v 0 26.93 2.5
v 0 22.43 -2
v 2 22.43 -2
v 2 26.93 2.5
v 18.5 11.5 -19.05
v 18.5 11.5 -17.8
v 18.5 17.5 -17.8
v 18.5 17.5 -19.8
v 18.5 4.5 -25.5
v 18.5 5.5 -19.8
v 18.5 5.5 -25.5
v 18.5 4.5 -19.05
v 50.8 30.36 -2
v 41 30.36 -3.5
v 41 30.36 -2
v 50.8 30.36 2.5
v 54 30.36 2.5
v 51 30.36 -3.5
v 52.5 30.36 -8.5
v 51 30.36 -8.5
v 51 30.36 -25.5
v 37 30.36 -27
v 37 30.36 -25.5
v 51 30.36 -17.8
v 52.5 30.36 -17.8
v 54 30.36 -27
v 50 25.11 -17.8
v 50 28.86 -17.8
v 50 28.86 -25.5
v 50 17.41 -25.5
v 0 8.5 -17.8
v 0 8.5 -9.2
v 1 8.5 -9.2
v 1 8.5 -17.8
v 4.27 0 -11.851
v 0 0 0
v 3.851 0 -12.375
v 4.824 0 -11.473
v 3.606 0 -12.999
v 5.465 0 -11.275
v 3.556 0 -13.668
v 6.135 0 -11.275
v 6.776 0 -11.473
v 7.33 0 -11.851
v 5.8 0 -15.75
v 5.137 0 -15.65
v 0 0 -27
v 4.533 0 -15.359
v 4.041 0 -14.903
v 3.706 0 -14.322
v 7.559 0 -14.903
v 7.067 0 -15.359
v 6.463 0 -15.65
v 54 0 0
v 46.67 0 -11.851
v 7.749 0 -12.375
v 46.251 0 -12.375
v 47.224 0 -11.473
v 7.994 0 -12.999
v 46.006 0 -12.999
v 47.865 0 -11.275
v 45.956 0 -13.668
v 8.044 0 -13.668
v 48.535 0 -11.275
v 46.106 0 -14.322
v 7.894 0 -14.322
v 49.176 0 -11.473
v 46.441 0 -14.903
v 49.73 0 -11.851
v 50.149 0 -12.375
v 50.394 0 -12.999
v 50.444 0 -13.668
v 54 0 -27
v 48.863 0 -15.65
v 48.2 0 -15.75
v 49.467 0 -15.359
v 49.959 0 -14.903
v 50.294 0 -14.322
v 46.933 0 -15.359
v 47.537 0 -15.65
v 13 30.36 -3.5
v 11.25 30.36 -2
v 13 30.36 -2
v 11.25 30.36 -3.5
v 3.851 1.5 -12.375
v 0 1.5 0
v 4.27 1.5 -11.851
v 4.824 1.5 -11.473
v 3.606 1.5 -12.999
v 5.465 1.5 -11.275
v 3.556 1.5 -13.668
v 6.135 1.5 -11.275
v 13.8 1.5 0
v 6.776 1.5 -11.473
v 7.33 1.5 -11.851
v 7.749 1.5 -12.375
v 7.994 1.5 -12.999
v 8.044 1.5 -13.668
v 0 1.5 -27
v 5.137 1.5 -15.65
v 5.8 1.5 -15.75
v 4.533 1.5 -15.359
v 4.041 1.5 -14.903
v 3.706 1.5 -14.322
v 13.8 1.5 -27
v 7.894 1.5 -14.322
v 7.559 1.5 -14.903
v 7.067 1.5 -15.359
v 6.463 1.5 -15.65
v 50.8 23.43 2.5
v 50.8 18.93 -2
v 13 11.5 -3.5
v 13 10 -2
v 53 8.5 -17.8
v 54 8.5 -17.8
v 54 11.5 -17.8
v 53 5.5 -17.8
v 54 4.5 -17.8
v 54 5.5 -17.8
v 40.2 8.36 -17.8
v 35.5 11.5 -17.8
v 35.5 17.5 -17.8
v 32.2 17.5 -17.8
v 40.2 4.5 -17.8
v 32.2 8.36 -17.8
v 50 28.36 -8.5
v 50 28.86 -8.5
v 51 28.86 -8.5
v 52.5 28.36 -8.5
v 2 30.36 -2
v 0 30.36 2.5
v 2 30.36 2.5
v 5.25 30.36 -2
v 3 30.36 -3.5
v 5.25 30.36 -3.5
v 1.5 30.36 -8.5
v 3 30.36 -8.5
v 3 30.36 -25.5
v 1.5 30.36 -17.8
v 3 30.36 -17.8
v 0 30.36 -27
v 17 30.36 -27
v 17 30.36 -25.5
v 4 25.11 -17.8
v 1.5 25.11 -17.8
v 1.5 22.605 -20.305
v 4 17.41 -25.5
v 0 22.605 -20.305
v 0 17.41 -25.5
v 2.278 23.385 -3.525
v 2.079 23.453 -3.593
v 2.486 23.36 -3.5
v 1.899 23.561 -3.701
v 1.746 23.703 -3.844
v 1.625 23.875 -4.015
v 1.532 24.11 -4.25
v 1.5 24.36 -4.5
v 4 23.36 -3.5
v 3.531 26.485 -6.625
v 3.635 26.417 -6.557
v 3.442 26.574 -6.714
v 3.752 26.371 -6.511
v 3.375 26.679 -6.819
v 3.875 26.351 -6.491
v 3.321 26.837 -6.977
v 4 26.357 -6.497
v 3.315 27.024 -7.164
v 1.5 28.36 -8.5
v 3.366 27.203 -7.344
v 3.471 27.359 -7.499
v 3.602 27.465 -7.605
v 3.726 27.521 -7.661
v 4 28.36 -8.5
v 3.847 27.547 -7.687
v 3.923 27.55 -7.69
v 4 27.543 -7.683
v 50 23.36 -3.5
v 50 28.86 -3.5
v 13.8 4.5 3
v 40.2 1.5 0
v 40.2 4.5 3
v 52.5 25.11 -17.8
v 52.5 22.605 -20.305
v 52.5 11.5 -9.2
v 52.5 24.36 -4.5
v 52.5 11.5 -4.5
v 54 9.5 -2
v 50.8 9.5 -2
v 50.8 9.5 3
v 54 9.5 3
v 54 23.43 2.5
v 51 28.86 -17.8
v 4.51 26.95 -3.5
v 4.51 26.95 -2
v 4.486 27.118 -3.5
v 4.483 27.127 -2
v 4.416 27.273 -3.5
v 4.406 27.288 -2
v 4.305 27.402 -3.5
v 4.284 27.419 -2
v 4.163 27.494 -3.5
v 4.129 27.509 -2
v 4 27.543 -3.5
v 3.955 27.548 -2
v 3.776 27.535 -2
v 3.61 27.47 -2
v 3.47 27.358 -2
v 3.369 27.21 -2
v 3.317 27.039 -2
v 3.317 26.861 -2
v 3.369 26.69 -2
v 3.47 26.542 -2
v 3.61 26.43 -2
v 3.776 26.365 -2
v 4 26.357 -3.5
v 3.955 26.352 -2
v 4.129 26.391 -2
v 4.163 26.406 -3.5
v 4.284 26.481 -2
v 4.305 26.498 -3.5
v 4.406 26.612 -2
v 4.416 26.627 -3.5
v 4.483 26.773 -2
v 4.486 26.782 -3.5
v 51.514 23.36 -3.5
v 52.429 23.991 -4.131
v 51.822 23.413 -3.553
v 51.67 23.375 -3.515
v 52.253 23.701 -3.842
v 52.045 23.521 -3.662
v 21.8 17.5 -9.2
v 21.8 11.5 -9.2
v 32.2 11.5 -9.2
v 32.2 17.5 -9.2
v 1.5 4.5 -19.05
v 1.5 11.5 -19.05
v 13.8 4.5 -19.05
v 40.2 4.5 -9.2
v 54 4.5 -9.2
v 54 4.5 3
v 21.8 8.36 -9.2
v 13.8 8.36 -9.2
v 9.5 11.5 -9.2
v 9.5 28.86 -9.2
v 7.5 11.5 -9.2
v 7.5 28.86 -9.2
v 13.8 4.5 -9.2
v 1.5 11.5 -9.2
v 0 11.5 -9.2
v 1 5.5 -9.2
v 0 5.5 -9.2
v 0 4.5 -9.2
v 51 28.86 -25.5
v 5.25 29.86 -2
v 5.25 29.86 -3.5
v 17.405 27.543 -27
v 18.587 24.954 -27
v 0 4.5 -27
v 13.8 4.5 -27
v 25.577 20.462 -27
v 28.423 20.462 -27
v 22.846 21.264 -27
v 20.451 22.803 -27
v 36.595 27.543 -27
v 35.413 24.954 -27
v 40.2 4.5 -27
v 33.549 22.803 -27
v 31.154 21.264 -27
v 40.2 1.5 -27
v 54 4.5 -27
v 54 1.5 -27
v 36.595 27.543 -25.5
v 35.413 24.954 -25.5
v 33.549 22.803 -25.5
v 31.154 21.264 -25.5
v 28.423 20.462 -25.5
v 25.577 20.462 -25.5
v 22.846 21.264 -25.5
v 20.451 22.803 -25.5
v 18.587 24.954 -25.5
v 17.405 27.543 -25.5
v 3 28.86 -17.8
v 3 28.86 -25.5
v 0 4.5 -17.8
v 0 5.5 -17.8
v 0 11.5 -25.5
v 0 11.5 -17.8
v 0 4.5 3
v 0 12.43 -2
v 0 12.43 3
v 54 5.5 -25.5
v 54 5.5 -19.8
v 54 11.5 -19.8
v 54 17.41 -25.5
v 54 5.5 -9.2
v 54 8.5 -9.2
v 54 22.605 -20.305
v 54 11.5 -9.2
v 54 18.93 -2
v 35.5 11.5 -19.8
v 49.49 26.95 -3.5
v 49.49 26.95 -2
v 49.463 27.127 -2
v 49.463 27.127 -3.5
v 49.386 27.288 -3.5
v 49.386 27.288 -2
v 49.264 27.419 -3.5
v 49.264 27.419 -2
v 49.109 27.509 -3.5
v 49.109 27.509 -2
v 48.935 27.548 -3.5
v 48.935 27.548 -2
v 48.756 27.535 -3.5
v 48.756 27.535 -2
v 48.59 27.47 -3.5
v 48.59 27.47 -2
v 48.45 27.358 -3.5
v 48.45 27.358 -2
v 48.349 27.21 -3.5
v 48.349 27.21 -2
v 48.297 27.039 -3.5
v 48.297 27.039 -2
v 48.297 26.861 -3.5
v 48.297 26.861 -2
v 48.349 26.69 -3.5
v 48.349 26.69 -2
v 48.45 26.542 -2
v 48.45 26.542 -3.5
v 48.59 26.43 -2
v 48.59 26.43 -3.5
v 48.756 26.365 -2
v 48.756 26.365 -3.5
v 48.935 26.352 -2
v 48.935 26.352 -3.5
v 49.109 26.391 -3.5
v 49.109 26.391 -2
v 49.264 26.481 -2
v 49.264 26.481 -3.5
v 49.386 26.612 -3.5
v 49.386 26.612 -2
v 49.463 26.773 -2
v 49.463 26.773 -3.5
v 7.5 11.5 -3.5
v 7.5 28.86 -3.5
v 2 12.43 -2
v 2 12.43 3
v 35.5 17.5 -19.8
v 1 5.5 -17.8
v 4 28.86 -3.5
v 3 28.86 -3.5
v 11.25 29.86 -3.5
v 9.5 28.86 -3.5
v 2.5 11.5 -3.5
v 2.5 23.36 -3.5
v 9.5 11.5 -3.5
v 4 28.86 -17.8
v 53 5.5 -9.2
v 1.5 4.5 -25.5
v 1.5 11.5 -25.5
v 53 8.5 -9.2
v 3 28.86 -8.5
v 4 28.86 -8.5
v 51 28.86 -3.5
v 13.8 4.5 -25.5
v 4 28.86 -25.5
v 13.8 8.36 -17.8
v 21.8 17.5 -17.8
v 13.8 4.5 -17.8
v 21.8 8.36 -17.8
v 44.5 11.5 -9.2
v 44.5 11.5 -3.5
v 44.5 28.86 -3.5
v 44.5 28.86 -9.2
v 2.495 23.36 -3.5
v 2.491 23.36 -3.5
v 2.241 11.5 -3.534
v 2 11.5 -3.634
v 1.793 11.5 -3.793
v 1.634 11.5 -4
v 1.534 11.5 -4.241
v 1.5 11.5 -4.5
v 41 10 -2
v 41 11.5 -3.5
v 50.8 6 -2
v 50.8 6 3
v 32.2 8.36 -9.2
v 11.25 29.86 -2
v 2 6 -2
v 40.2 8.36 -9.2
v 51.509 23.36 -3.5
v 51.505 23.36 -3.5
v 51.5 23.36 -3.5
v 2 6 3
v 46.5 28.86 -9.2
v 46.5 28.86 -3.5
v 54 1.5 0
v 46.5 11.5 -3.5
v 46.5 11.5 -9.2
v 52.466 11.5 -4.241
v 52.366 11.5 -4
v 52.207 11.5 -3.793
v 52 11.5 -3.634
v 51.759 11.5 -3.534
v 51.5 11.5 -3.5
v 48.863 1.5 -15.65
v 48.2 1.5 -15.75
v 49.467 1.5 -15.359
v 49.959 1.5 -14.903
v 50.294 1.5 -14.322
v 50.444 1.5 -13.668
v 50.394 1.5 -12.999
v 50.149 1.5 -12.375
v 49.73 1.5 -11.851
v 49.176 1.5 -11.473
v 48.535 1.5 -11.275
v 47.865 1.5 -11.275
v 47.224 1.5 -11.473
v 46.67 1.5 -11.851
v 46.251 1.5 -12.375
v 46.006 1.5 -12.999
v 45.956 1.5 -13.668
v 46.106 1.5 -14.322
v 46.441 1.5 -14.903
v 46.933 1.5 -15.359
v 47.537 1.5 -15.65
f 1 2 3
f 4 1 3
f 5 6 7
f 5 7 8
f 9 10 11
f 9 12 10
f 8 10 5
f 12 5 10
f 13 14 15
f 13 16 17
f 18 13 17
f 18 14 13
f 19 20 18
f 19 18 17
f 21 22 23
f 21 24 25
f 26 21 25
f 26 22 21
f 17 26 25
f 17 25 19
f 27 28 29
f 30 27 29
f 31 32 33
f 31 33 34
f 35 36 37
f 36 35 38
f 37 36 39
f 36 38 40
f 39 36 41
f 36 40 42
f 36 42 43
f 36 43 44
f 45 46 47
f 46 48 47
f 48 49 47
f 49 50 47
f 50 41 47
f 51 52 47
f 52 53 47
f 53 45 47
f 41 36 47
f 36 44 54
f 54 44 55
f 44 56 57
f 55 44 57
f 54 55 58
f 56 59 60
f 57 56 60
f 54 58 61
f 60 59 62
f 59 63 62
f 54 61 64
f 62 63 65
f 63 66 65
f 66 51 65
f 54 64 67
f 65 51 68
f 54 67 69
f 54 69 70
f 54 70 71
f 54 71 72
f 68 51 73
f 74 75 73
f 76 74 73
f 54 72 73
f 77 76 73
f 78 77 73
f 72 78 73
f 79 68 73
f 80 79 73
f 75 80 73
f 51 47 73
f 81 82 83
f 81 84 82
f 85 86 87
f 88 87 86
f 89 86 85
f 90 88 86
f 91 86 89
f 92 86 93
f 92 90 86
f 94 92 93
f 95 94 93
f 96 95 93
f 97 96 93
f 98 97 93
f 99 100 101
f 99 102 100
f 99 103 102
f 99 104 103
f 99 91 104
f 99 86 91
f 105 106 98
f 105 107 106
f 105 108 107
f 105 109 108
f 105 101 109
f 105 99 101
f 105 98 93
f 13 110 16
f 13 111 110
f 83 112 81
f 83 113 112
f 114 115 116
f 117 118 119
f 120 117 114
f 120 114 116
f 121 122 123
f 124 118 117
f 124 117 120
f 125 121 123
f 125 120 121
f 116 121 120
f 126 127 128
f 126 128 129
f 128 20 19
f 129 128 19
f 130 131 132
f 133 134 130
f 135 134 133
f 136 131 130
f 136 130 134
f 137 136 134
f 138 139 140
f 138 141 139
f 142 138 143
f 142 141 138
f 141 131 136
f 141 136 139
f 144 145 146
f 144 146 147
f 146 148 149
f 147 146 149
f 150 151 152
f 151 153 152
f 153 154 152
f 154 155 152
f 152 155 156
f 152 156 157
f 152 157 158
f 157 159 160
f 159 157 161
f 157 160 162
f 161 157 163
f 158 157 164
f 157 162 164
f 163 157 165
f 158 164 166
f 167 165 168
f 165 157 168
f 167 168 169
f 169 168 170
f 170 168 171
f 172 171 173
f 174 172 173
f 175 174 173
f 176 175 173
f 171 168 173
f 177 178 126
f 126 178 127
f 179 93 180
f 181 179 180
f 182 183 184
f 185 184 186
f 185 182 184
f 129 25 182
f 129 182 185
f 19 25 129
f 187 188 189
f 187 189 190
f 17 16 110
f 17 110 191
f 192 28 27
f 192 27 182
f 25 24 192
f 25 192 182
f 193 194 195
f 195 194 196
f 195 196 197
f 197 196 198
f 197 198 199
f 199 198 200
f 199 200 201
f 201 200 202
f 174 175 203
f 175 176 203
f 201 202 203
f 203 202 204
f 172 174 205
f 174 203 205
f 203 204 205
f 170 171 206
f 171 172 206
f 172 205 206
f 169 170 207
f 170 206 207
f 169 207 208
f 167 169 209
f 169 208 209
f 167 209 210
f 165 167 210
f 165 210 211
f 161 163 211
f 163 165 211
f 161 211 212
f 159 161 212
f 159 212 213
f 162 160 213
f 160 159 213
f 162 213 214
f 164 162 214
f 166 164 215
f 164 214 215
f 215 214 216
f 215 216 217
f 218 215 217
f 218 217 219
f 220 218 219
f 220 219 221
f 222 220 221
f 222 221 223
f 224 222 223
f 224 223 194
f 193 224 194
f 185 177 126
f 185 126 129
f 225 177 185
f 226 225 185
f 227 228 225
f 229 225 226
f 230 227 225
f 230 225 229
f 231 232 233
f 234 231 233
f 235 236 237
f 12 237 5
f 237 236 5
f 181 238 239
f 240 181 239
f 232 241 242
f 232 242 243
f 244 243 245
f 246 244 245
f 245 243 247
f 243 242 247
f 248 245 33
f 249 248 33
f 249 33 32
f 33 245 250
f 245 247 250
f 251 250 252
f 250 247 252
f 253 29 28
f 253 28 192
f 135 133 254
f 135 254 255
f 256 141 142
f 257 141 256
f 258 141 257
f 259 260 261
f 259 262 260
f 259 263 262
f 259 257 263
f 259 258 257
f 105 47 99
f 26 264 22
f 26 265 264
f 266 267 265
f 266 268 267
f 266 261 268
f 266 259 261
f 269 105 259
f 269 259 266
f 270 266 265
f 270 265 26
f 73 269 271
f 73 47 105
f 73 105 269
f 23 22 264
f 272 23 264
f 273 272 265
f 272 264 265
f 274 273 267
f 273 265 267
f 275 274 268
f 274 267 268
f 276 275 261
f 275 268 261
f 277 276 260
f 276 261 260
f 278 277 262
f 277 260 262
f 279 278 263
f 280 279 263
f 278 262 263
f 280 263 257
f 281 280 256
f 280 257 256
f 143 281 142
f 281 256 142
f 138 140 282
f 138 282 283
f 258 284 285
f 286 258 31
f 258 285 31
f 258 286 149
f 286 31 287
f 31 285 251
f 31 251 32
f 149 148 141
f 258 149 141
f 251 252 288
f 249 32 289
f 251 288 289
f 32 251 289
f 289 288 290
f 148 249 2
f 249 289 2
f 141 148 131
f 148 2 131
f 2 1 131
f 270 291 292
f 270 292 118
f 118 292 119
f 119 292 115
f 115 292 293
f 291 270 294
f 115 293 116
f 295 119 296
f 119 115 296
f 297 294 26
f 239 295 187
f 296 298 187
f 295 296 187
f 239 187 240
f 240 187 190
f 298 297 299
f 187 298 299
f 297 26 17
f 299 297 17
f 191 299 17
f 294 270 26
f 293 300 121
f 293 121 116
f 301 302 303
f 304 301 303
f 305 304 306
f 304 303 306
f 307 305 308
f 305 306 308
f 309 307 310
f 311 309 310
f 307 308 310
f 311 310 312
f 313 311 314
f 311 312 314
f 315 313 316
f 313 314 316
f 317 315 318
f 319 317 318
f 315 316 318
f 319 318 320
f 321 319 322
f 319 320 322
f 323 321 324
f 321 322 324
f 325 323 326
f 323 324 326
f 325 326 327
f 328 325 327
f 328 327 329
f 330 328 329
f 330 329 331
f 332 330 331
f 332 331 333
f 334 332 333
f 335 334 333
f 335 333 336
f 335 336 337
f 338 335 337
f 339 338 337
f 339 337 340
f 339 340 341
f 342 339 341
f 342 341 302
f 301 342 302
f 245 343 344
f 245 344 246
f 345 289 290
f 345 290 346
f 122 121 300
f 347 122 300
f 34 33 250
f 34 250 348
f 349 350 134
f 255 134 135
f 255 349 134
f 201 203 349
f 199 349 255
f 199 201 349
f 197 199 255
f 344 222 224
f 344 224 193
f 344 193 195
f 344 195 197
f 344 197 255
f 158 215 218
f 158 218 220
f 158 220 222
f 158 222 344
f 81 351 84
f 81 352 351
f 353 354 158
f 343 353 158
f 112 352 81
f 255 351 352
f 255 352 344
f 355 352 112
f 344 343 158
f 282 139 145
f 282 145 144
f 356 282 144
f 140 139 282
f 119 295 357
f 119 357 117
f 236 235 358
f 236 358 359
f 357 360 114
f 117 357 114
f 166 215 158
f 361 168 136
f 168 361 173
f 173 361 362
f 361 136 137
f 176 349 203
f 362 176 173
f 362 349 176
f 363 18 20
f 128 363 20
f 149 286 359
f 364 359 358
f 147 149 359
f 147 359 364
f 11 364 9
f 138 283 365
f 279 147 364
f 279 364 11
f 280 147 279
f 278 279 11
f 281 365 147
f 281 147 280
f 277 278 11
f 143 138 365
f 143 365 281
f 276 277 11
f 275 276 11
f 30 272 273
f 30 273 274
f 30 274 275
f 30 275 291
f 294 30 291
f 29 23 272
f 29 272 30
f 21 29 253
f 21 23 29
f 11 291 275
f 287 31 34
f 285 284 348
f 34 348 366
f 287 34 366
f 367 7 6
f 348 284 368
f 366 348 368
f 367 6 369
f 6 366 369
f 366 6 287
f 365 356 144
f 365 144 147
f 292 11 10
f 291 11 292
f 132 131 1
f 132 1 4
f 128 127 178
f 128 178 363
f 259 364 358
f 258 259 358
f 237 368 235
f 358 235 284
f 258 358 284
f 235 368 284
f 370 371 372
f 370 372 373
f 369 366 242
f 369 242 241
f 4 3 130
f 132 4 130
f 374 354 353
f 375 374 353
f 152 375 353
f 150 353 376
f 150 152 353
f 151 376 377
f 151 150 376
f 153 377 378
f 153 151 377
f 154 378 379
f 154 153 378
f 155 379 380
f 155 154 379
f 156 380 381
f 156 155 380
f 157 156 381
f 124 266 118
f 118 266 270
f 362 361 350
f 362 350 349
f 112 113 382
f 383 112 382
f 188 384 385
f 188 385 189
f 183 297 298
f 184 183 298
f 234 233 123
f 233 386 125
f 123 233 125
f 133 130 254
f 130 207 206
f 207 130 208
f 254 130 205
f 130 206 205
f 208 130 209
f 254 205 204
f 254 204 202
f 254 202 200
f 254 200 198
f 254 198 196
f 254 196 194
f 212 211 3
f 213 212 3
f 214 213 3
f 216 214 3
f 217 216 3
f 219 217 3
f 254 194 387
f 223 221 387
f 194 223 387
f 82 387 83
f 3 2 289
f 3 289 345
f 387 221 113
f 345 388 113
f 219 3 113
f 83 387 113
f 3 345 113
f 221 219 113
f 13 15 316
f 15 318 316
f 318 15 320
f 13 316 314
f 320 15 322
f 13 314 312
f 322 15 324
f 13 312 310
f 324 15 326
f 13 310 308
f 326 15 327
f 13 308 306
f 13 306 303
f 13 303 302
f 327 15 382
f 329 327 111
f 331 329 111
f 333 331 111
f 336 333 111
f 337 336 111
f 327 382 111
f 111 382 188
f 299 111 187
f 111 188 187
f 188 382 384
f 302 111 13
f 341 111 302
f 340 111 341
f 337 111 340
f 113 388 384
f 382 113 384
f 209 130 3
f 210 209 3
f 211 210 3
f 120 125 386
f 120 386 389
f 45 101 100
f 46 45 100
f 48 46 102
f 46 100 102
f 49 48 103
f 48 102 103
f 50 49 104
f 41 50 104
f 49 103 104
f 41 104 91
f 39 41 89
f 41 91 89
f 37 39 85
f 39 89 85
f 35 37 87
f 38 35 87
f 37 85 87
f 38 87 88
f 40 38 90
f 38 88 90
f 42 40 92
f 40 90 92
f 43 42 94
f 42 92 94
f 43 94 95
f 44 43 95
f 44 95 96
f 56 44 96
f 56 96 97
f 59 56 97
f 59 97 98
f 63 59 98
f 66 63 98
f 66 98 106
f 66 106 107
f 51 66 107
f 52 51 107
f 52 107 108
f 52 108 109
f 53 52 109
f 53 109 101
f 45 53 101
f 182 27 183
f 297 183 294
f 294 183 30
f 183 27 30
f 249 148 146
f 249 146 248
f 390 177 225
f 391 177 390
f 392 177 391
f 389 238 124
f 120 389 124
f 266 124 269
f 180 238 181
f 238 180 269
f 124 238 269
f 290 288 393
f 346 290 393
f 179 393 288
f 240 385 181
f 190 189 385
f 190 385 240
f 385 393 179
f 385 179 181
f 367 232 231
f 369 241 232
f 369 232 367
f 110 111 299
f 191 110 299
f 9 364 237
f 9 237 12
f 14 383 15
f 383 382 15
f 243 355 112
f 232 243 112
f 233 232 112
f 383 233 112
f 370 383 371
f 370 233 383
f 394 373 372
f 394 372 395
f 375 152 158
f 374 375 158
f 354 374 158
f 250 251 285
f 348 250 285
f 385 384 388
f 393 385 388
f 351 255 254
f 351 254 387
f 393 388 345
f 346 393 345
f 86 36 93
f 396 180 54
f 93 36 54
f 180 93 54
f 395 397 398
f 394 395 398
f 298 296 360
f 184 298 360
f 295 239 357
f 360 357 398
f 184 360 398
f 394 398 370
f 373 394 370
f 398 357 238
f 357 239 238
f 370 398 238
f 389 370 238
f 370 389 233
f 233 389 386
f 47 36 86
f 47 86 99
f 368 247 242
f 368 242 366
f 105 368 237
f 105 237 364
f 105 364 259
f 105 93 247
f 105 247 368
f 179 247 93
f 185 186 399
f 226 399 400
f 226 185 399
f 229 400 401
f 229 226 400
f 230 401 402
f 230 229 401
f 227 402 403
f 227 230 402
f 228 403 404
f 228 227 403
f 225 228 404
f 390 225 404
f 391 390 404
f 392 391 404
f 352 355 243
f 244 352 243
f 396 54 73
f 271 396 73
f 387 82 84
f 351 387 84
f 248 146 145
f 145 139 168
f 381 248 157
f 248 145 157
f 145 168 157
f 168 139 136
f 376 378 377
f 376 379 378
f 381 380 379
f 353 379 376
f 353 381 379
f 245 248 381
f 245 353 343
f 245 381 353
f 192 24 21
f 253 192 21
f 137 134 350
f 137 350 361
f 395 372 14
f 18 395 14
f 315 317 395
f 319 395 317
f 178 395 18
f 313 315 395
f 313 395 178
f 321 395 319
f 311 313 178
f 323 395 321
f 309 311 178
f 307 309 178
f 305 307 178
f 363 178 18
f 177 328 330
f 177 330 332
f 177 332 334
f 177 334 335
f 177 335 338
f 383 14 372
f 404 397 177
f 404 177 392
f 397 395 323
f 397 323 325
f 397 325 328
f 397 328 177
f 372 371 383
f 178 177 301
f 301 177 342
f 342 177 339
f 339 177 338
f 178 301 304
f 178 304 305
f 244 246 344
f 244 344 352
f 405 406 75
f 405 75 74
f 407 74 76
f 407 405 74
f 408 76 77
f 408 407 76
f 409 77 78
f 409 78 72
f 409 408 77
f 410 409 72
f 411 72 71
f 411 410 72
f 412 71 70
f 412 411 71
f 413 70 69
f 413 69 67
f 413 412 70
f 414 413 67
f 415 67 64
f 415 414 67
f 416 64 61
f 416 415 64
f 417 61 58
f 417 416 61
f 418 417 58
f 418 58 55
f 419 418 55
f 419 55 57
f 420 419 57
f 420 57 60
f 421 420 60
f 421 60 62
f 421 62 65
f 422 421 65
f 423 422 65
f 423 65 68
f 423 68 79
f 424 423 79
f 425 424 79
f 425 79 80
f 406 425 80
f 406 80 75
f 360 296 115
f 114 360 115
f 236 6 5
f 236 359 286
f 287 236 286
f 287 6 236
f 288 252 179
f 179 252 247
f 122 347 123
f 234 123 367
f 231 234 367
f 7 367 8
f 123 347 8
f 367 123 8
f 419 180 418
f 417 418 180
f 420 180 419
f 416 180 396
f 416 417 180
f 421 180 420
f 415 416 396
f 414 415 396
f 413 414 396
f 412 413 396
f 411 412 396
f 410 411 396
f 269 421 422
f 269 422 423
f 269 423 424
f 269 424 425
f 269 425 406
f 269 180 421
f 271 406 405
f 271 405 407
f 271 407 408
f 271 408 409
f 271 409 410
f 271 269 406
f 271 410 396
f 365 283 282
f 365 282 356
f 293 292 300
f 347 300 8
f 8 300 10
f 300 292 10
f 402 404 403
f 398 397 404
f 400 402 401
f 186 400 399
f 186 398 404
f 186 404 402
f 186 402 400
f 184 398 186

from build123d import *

# Parameters (mm, degrees)
SKETCH1_W                      = 54
SKETCH1_H                      = 27
BOSS_EXTRUDE1_DEPTH            = 1.5
CUT_EXTRUDE1_REACH             = 62.392
SKETCH2_R                      = 2.25
CUT_EXTRUDE1_DIRECTION_2_DEPTH = 61.392466418
SKETCH3_W                      = 26.4
SKETCH3_H                      = 30
BOSS_EXTRUDE2_DEPTH            = 3
CHAMFER3_SIZE                  = 3
BOSS_EXTRUDE3_DEPTH            = 7
SKETCH25_W                     = 8.6
SKETCH25_H                     = 3
BOSS_EXTRUDE19_DEPTH           = 1
BOSS_EXTRUDE15_START           = 7
SKETCH4_4_W                    = 10.4
SKETCH4_4_H                    = 8.6
BOSS_EXTRUDE15_DEPTH           = 6
SKETCH5_W                      = 54
SKETCH5_H                      = 1.5
BOSS_EXTRUDE5_DEPTH            = 18.86
SKETCH5_3_W                    = 2
SKETCH5_3_H                    = 5.7
BOSS_EXTRUDE6_DEPTH            = 17.36
SKETCH4_3_W                    = 8
SKETCH4_3_H                    = 8.6
BOSS_EXTRUDE12_DEPTH           = 3.86
SKETCH17_W                     = 2
SKETCH17_H                     = 6.43
SKETCH17_W_2                   = 3.2
SKETCH17_H_2                   = 3.5
BOSS_EXTRUDE13_DEPTH           = 5
SKETCH17_3_W                   = 2
SKETCH17_3_H                   = 7.93
SKETCH17_3_W_2                 = 3.2
SKETCH17_3_H_2                 = 11.43
BOSS_EXTRUDE16_DEPTH           = 4.5
CHAMFER7_SIZE                  = 4.5
SKETCH5_4_W                    = 54
SKETCH5_4_H                    = 1.5
BOSS_EXTRUDE8_DEPTH            = 18.86
BOSS_EXTRUDE9_DEPTH            = 1.5
SKETCH18_W                     = 4
SKETCH18_H                     = 7.7
BOSS_EXTRUDE14_DEPTH           = 13
SKETCH18_3_W                   = 2.5
SKETCH18_3_H                   = 5
BOSS_EXTRUDE17_DEPTH           = 7
CHAMFER8_SIZE                  = 5
CHAMFER6_SIZE                  = 7.75
SKETCH20_W                     = 1
SKETCH20_H                     = 7.7
SKETCH20_H_2                   = 5
CUT_EXTRUDE7_DEPTH             = 1.5
SKETCH22_W                     = 6
SKETCH22_H                     = 1.5
CUT_EXTRUDE10_DEPTH            = 0.5
SKETCH12_W                     = 28
SKETCH12_H                     = 18.86
CUT_EXTRUDE2_DEPTH             = 7.2
CUT_EXTRUDE3_DEPTH             = 1.5
SKETCH15_W                     = 9
SKETCH15_H                     = 2
BOSS_EXTRUDE11_DEPTH           = 6
SKETCH21_W                     = 18.5
SKETCH21_H                     = 5.7
SKETCH21_H_2                   = 0.75
CUT_EXTRUDE8_DEPTH             = 6
CUT_EXTRUDE9_START             = -6
SKETCH21_3_W                   = 18.5
SKETCH21_3_H                   = 5.7
SKETCH21_3_H_2                 = 0.75
CUT_EXTRUDE9_DEPTH             = 1
FILLET7_R                      = 1
CUT_EXTRUDE11_REACH            = 68.804
SKETCH23_R                     = 0.6
CHAMFER9_SIZE                  = 1.5
BOSS_EXTRUDE18_REACH           = 67.757
SKETCH24_W                     = 1.5
SKETCH24_H                     = 7


# Some blends are built 0.0001 mm under size
with BuildPart() as part:
    # Sketch1 → Boss-Extrude1 (new body)
    with BuildSketch(Plane(origin=(0, 0, 0), x_dir=(1, 0, 0), z_dir=(0, 1, 0))):
        with Locations((27, 13.5)):
            Rectangle(SKETCH1_W, SKETCH1_H)
    extrude(amount=BOSS_EXTRUDE1_DEPTH)

    # Sketch2 → Cut-Extrude1 (cut, up to next)
    with BuildSketch(Plane(origin=(0, 1.5, 0), x_dir=(1, 0, 0), z_dir=(0, 1, 0)), mode=Mode.PRIVATE) as cut_extrude1_sk1:
        with Locations(Location((5.8, 13.5, 0), (0, 0, 90))):
            Circle(SKETCH2_R)
    cut_extrude1_tool1 = extrude(cut_extrude1_sk1.sketch, amount=-CUT_EXTRUDE1_REACH, mode=Mode.PRIVATE) & part.part
    cut_extrude1 = cut_extrude1_tool1.solids().sort_by_distance((5.8, 1.5, -13.5))[0]
    add(cut_extrude1, mode=Mode.SUBTRACT)

    # Sketch2 → Cut-Extrude1 direction 2 (cut)
    with BuildSketch(Plane(origin=(0, 1.5, 0), x_dir=(1, 0, 0), z_dir=(0, 1, 0))):
        with Locations(Location((5.8, 13.5, 0), (0, 0, 90))):
            Circle(SKETCH2_R)
    cut_extrude1_direction_2 = extrude(amount=CUT_EXTRUDE1_DIRECTION_2_DEPTH, mode=Mode.SUBTRACT)

    # Mirror1: Cut-Extrude1, Cut-Extrude1 direction 2 across plane
    add(cut_extrude1.mirror(Plane.ZY.offset(-27)), mode=Mode.SUBTRACT)
    add(cut_extrude1_direction_2.mirror(Plane.ZY.offset(-27)), mode=Mode.SUBTRACT)

    # Sketch3 → Boss-Extrude2 (add)
    with BuildSketch(Plane(origin=(0, 1.5, 0), x_dir=(1, 0, 0), z_dir=(0, 1, 0))):
        with Locations((27, 12)):
            Rectangle(SKETCH3_W, SKETCH3_H)
    extrude(amount=BOSS_EXTRUDE2_DEPTH)

    # Chamfer3
    chamfer3_edges = [part.edges().sort_by_distance(p)[0] for p in [
        (27, 1.5, 3),
    ]]
    chamfer(chamfer3_edges, length=CHAMFER3_SIZE - 0.0001)  # a hair under: the kernel refuses the full size

    # Sketch4 → Boss-Extrude3 (add)
    with BuildSketch(Plane(origin=(0, 4.5, 0), x_dir=(1, 0, 0), z_dir=(0, 1, 0))):
        Polygon((54, 27), (0, 27), (0, 17.8), (21.8, 17.8), (21.8, 9.2), (0, 9.2), (0, 2), (54, 2), (54, 9.2), (32.2, 9.2), (32.2, 17.8), (54, 17.8), align=None)
    extrude(amount=BOSS_EXTRUDE3_DEPTH)

    # Sketch25 → Boss-Extrude19 (add)
    with BuildSketch(Plane(origin=(54, 0, 0), x_dir=(0, 0, -1), z_dir=(1, 0, 0))):
        with Locations((13.5, 7)):
            Rectangle(SKETCH25_W, SKETCH25_H)
    boss_extrude19 = extrude(amount=-BOSS_EXTRUDE19_DEPTH)

    # Mirror6: Boss-Extrude19 across plane
    add(boss_extrude19.mirror(Plane.ZY.offset(-27)))

    # Sketch4<4> → Boss-Extrude15 (add)
    with BuildSketch(Plane(origin=(0, 4.5, 0), x_dir=(1, 0, 0), z_dir=(0, 1, 0)).offset(BOSS_EXTRUDE15_START)):
        with Locations((27, 13.5)):
            Rectangle(SKETCH4_4_W, SKETCH4_4_H)
    extrude(amount=BOSS_EXTRUDE15_DEPTH)

    # Sketch5 → Boss-Extrude5 (add)
    with BuildSketch(Plane(origin=(0, 11.5, 0), x_dir=(1, 0, 0), z_dir=(0, 1, 0))):
        with Locations((27, 2.75)):
            Rectangle(SKETCH5_W, SKETCH5_H)
    extrude(amount=BOSS_EXTRUDE5_DEPTH)

    # Sketch5<3> → Boss-Extrude6 (add)
    with BuildSketch(Plane(origin=(0, 11.5, 0), x_dir=(1, 0, 0), z_dir=(0, 1, 0))):
        with Locations((45.5, 6.35)):
            Rectangle(SKETCH5_3_W, SKETCH5_3_H)
        with Locations((8.5, 6.35)):
            Rectangle(SKETCH5_3_W, SKETCH5_3_H)
    extrude(amount=BOSS_EXTRUDE6_DEPTH)

    # Sketch4<3> → Boss-Extrude12 (add)
    with BuildSketch(Plane(origin=(0, 4.5, 0), x_dir=(1, 0, 0), z_dir=(0, 1, 0))):
        with Locations((17.8, 13.5)):
            Rectangle(SKETCH4_3_W, SKETCH4_3_H)
        with Locations((36.2, 13.5)):
            Rectangle(SKETCH4_3_W, SKETCH4_3_H)
    extrude(amount=BOSS_EXTRUDE12_DEPTH)

    # Sketch17 → Boss-Extrude13 (add)
    with BuildSketch(Plane.XY.offset(-2)):
        with Locations((1, 9.215)):
            Rectangle(SKETCH17_W, SKETCH17_H)
        Polygon((0, 6), (0, 4.5), (13.8, 4.5), (40.2, 4.5), (54, 4.5), (54, 6), (50.8, 6), (2, 6), align=None)
        with Locations((52.4, 7.75)):
            Rectangle(SKETCH17_W_2, SKETCH17_H_2)
    extrude(amount=BOSS_EXTRUDE13_DEPTH)

    # Sketch17<3> → Boss-Extrude16 (add)
    with BuildSketch(Plane.XY.offset(-2)):
        with Locations((1, 26.395)):
            Rectangle(SKETCH17_3_W, SKETCH17_3_H)
        with Locations((52.4, 24.645)):
            Rectangle(SKETCH17_3_W_2, SKETCH17_3_H_2)
    extrude(amount=BOSS_EXTRUDE16_DEPTH)

    # Chamfer7
    chamfer7_edges = [part.edges().sort_by_distance(p)[0] for p in [
        (52.4, 18.93, 2.5),
        (1, 22.43, 2.5),
    ]]
    chamfer(chamfer7_edges, length=CHAMFER7_SIZE - 0.0001)  # a hair under: the kernel refuses the full size

    # Sketch5<4> → Boss-Extrude8 (add)
    with BuildSketch(Plane(origin=(0, 11.5, 0), x_dir=(1, 0, 0), z_dir=(0, 1, 0))):
        with Locations((27, 26.25)):
            Rectangle(SKETCH5_4_W, SKETCH5_4_H)
    extrude(amount=BOSS_EXTRUDE8_DEPTH)

    # Sketch10 → Boss-Extrude9 (add)
    with BuildSketch(Plane.ZY):
        Polygon((-3.5, 11.5), (-3.5, 30.36), (-25.5, 30.36), (-25.5, 27.8), (-9.2, 11.5), align=None)
    boss_extrude9 = extrude(amount=-BOSS_EXTRUDE9_DEPTH)

    # Mirror3: Boss-Extrude9 across plane
    add(boss_extrude9.mirror(Plane.ZY.offset(-27)))

    # Sketch18 → Boss-Extrude14 (add)
    with BuildSketch(Plane(origin=(0, 30.36, 0), x_dir=(1, 0, 0), z_dir=(0, 1, 0))):
        with Locations((2, 21.65)):
            Rectangle(SKETCH18_W, SKETCH18_H)
        with Locations((52, 21.65)):
            Rectangle(SKETCH18_W, SKETCH18_H)
    extrude(amount=-BOSS_EXTRUDE14_DEPTH)

    # Sketch18<3> → Boss-Extrude17 (add)
    with BuildSketch(Plane(origin=(0, 30.36, 0), x_dir=(1, 0, 0), z_dir=(0, 1, 0))):
        with Locations((51.25, 6)):
            Rectangle(SKETCH18_3_W, SKETCH18_3_H)
        with Locations((2.75, 6)):
            Rectangle(SKETCH18_3_W, SKETCH18_3_H)
    extrude(amount=-BOSS_EXTRUDE17_DEPTH)

    # Chamfer8
    chamfer8_edges = [part.edges().sort_by_distance(p)[0] for p in [
        (51.25, 23.36, -8.5),
        (2.75, 23.36, -8.5),
    ]]
    chamfer(chamfer8_edges, length=CHAMFER8_SIZE - 0.0001)  # a hair under: the kernel refuses the full size

    # Chamfer6
    # the kernel refuses this chamfer: 7.75 mm, written as the material it takes off along each edge
    with BuildSketch(Plane(origin=(-19.930543157, 17.36, -17.8), x_dir=(0, 0.9996219169112968, 0.027495876610586188), z_dir=(1, 0, 0))) as chamfer6_piece_1_section:
        Polygon((CHAMFER6_SIZE * 0.999621916911, -CHAMFER6_SIZE * 0.0274958766106), (-CHAMFER6_SIZE * 0.0274958766106, -CHAMFER6_SIZE * 0.999621916911), (0, 0), align=None)
    chamfer6_piece_1 = extrude(amount=43.861086313, mode=Mode.PRIVATE)
    chamfer6_piece_1 = split(chamfer6_piece_1, bisect_by=Plane(origin=(0.75, 21.216778897, -18.916778897), z_dir=(0, -0.7071067811865515, -0.7071067811865436)), keep=Keep.TOP, mode=Mode.PRIVATE)
    chamfer6_piece_1 = split(chamfer6_piece_1, bisect_by=Plane(origin=(0.75, 19.326101078, -25.5), z_dir=(0, 0, 1)), keep=Keep.TOP, mode=Mode.PRIVATE)
    add(chamfer6_piece_1, mode=Mode.SUBTRACT)
    with BuildSketch(Plane(origin=(-19.930543157, 17.36, -17.8), x_dir=(0, 0.9996219169112968, 0.027495876610586188), z_dir=(1, 0, 0))) as chamfer6_piece_2_section:
        Polygon((CHAMFER6_SIZE * 0.999621916911, -CHAMFER6_SIZE * 0.0274958766106), (-CHAMFER6_SIZE * 0.0274958766106, -CHAMFER6_SIZE * 0.999621916911), (0, 0), align=None)
    chamfer6_piece_2 = extrude(amount=43.861086313, mode=Mode.PRIVATE)
    chamfer6_piece_2 = split(chamfer6_piece_2, bisect_by=Plane(origin=(1.5, 22.605, -18.635), z_dir=(1, 0, 0)), keep=Keep.TOP, mode=Mode.PRIVATE)
    chamfer6_piece_2 = split(chamfer6_piece_2, bisect_by=Plane(origin=(2.75, 17.5, -18.635), z_dir=(0, 1, 0)), keep=Keep.TOP, mode=Mode.PRIVATE)
    add(chamfer6_piece_2, mode=Mode.SUBTRACT)
    with BuildSketch(Plane(origin=(30.069456843, 17.36, -17.8), x_dir=(0, 0.9996219169112968, 0.027495876610586188), z_dir=(1, 0, 0))) as chamfer6_piece_3_section:
        Polygon((CHAMFER6_SIZE * 0.999621916911, -CHAMFER6_SIZE * 0.0274958766106), (-CHAMFER6_SIZE * 0.0274958766106, -CHAMFER6_SIZE * 0.999621916911), (0, 0), align=None)
    chamfer6_piece_3 = extrude(amount=43.861086313, mode=Mode.PRIVATE)
    chamfer6_piece_3 = split(chamfer6_piece_3, bisect_by=Plane(origin=(51.25, 22.605, -25.5), z_dir=(0, 0, 1)), keep=Keep.TOP, mode=Mode.PRIVATE)
    chamfer6_piece_3 = split(chamfer6_piece_3, bisect_by=Plane(origin=(52.5, 22.605, -18.635), z_dir=(-1, 0, 0)), keep=Keep.TOP, mode=Mode.PRIVATE)
    add(chamfer6_piece_3, mode=Mode.SUBTRACT)
    with BuildSketch(Plane(origin=(30.069456843, 17.36, -17.8), x_dir=(0, 0.9996219169112968, 0.027495876610586188), z_dir=(1, 0, 0))) as chamfer6_piece_4_section:
        Polygon((CHAMFER6_SIZE * 0.999621916911, -CHAMFER6_SIZE * 0.0274958766106), (-CHAMFER6_SIZE * 0.0274958766106, -CHAMFER6_SIZE * 0.999621916911), (0, 0), align=None)
    chamfer6_piece_4 = extrude(amount=43.861086313, mode=Mode.PRIVATE)
    chamfer6_piece_4 = split(chamfer6_piece_4, bisect_by=Plane(origin=(53.25, 19.326101078, -25.5), z_dir=(0, 0, 1)), keep=Keep.TOP, mode=Mode.PRIVATE)
    chamfer6_piece_4 = split(chamfer6_piece_4, bisect_by=Plane(origin=(53.25, 21.216778897, -18.916778897), z_dir=(0, -0.7071067811865515, -0.7071067811865436)), keep=Keep.TOP, mode=Mode.PRIVATE)
    add(chamfer6_piece_4, mode=Mode.SUBTRACT)

    # Sketch20 → Cut-Extrude7 (cut)
    with BuildSketch(Plane(origin=(0, 30.36, 0), x_dir=(1, 0, 0), z_dir=(0, 1, 0))):
        with Locations((3.5, 21.65)):
            Rectangle(SKETCH20_W, SKETCH20_H)
        with Locations((50.5, 21.65)):
            Rectangle(SKETCH20_W, SKETCH20_H)
        with Locations((3.5, 6)):
            Rectangle(SKETCH20_W, SKETCH20_H_2)
        with Locations((50.5, 6)):
            Rectangle(SKETCH20_W, SKETCH20_H_2)
    extrude(amount=-CUT_EXTRUDE7_DEPTH, mode=Mode.SUBTRACT)

    # Sketch22 → Cut-Extrude10 (cut)
    with BuildSketch(Plane(origin=(0, 30.36, 0), x_dir=(1, 0, 0), z_dir=(0, 1, 0))):
        with Locations((8.25, 2.75)):
            Rectangle(SKETCH22_W, SKETCH22_H)
    extrude(amount=-CUT_EXTRUDE10_DEPTH, mode=Mode.SUBTRACT)

    # Sketch12 → Cut-Extrude2 (cut)
    with BuildSketch(Plane.XY.offset(-2)):
        with Locations((27, 20.93)):
            Rectangle(SKETCH12_W, SKETCH12_H)
    extrude(amount=-CUT_EXTRUDE2_DEPTH, mode=Mode.SUBTRACT)

    # Sketch14 → Cut-Extrude3 (cut)
    with BuildSketch(Plane(origin=(0, 0, -27), x_dir=(-1, 0, 0), z_dir=(0, 0, -1))):
        with BuildLine():
            ThreePointArc((-17, 30.36), (-27, 40.36), (-37, 30.36))
            Line((-37, 30.36), (-17, 30.36))
        make_face()
        with BuildLine():
            Line((-17, 30.36), (-37, 30.36))
            ThreePointArc((-37, 30.36), (-27, 20.36), (-17, 30.36))
        make_face()
    extrude(amount=-CUT_EXTRUDE3_DEPTH, mode=Mode.SUBTRACT)

    # Sketch15 → Boss-Extrude11 (add)
    with BuildSketch(Plane(origin=(0, 11.5, 0), x_dir=(1, 0, 0), z_dir=(0, 1, 0))):
        with Locations((23, 18.8)):
            Rectangle(SKETCH15_W, SKETCH15_H)
    boss_extrude11 = extrude(amount=BOSS_EXTRUDE11_DEPTH)

    # Mirror5: Boss-Extrude11 across plane
    add(boss_extrude11.mirror(Plane.ZY.offset(-27)))

    # Sketch21 → Cut-Extrude8 (cut)
    with BuildSketch(Plane(origin=(0, 11.5, 0), x_dir=(1, 0, 0), z_dir=(0, 1, 0))):
        Polygon((54, 25.5), (18.5, 25.5), (18.5, 19.8), (35.5, 19.8), (54, 19.8), align=None)
        with Locations((9.25, 22.65)):
            Rectangle(SKETCH21_W, SKETCH21_H)
        with Locations((9.25, 19.425)):
            Rectangle(SKETCH21_W, SKETCH21_H_2)
    extrude(amount=-CUT_EXTRUDE8_DEPTH, mode=Mode.SUBTRACT)

    # Sketch21<3> → Cut-Extrude9 (cut)
    with BuildSketch(Plane(origin=(0, 11.5, 0), x_dir=(1, 0, 0), z_dir=(0, 1, 0)).offset(CUT_EXTRUDE9_START)):
        with Locations((9.25, 22.65)):
            Rectangle(SKETCH21_3_W, SKETCH21_3_H)
        with Locations((9.25, 19.425)):
            Rectangle(SKETCH21_3_W, SKETCH21_3_H_2)
    extrude(amount=-CUT_EXTRUDE9_DEPTH, mode=Mode.SUBTRACT)

    # Fillet7
    fillet7_edges = [part.edges().sort_by_distance(p)[0] for p in [
        (1.5, 17.43, -3.5),
        (52.5, 17.43, -3.5),
    ]]
    fillet(fillet7_edges, radius=FILLET7_R)

    # Sketch23 → Cut-Extrude11 (cut, up to next)
    with BuildSketch(Plane.XY.offset(-2), mode=Mode.PRIVATE) as cut_extrude11_sk1:
        with Locations((3.91, 26.95)):
            Circle(SKETCH23_R)
    cut_extrude11_tool1 = extrude(cut_extrude11_sk1.sketch, amount=-CUT_EXTRUDE11_REACH, mode=Mode.PRIVATE) & part.part
    # Sketch23 → Cut-Extrude11 (cut, up to next)
    with BuildSketch(Plane.XY.offset(-2), mode=Mode.PRIVATE) as cut_extrude11_sk2:
        with Locations((48.89, 26.95)):
            Circle(SKETCH23_R)
    cut_extrude11_tool2 = extrude(cut_extrude11_sk2.sketch, amount=-CUT_EXTRUDE11_REACH, mode=Mode.PRIVATE) & part.part
    add(cut_extrude11_tool1.solids().sort_by_distance((3.91, 26.95, -2))[0], mode=Mode.SUBTRACT)
    add(cut_extrude11_tool2.solids().sort_by_distance((48.89, 26.95, -2))[0], mode=Mode.SUBTRACT)

    # Chamfer9
    chamfer9_edges = [part.edges().sort_by_distance(p)[0] for p in [
        (27, 11.5, -2),
    ]]
    chamfer(chamfer9_edges, length=CHAMFER9_SIZE)

    # Sketch24 → Boss-Extrude18 (add, up to next)
    with BuildSketch(Plane(origin=(0, 0, -19.05), x_dir=(-1, 0, 0), z_dir=(0, 0, -1)), mode=Mode.PRIVATE) as boss_extrude18_sk1:
        with Locations((-0.75, 8)):
            Rectangle(SKETCH24_W, SKETCH24_H)
    boss_extrude18_tool1 = extrude(boss_extrude18_sk1.sketch, amount=BOSS_EXTRUDE18_REACH, mode=Mode.PRIVATE) - part.part
    add(boss_extrude18_tool1.solids().sort_by_distance((0.75, 8, -19.05))[0])


solid = part.part
